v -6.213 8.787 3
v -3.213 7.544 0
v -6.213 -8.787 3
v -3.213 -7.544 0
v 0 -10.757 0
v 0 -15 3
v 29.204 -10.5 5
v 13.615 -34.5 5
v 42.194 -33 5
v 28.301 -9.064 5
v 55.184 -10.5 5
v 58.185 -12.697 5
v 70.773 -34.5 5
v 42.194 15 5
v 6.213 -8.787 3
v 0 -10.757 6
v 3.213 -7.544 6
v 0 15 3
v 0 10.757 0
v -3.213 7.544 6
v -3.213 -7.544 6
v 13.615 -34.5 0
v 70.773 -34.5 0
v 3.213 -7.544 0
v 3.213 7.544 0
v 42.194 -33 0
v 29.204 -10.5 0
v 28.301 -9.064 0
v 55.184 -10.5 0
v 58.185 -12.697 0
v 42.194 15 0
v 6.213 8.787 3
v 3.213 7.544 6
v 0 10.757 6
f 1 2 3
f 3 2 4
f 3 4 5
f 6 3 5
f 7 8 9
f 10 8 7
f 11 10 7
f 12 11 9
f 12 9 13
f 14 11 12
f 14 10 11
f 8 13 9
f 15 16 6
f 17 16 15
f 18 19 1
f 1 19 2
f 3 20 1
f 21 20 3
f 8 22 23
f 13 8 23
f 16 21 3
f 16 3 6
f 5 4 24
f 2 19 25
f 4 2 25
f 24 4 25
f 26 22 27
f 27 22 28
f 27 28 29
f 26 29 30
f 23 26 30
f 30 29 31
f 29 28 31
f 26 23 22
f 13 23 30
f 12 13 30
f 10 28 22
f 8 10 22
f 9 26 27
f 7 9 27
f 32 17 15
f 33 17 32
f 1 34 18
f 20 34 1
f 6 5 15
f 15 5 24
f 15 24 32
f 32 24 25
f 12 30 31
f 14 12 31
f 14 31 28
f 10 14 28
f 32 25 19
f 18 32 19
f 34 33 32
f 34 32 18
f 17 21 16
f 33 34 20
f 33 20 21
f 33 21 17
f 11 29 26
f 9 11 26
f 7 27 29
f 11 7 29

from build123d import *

# Parameters (mm, degrees)
F1_DEPTH = 6
F2_SIZE  = 2.99999
F4_DEPTH = 5


# Not quite as in the source:
# - a fillet or chamfer is up to 0.001 mm smaller than in the source, because OpenCascade refuses the exact size


with BuildPart() as f1:
    # F0 (on Top) → F1 (new body)
    with BuildSketch(Plane.XY):
        Polygon((-6.2132034356, 8.7867965644), (-6.2132034356, 0), (-6.2132034356, -8.7867965644), (0, -15), (6.2132034356, -8.7867965644), (6.2132034356, 0), (6.2132034356, 8.7867965644), (0, 15), align=None)
    extrude(amount=F1_DEPTH)

    # F2 (size 3 in the source; OpenCascade refuses exactly that, so slightly less here)
    f2_edges = [f1.edges().sort_by_distance(p)[0] for p in [
        (-3.106602, 11.893398, 6),
        (3.106602, 11.893398, 6),
        (6.213203, 0, 6),
        (-6.213203, 0, 6),
        (-3.106602, -11.893398, 6),
        (3.106602, -11.893398, 6),
        (-3.106602, 11.893398, 0),
        (-6.213203, 0, 0),
        (-3.106602, -11.893398, 0),
        (3.106602, -11.893398, 0),
        (6.213203, 0, 0),
        (3.106602, 11.893398, 0),
    ]]
    chamfer(f2_edges, length=F2_SIZE)


with BuildPart() as f4:
    # F3 (on Top) → F4 (new body)
    with BuildSketch(Plane.XY):
        Polygon((28.300814713, -9.0636431253), (13.6151272242, -34.5), (28.8406131639, -34.5), (70.772803874, -34.5), (58.1850934371, -12.6974459723), (42.1939655491, 15), align=None)
        Polygon((29.2035844924, -10.5), (42.1939655491, -10.5), (55.1843466059, -10.5), (42.1939655491, -33), align=None, mode=Mode.SUBTRACT)
    extrude(amount=F4_DEPTH)


solid = Compound([f1.part, f4.part])
